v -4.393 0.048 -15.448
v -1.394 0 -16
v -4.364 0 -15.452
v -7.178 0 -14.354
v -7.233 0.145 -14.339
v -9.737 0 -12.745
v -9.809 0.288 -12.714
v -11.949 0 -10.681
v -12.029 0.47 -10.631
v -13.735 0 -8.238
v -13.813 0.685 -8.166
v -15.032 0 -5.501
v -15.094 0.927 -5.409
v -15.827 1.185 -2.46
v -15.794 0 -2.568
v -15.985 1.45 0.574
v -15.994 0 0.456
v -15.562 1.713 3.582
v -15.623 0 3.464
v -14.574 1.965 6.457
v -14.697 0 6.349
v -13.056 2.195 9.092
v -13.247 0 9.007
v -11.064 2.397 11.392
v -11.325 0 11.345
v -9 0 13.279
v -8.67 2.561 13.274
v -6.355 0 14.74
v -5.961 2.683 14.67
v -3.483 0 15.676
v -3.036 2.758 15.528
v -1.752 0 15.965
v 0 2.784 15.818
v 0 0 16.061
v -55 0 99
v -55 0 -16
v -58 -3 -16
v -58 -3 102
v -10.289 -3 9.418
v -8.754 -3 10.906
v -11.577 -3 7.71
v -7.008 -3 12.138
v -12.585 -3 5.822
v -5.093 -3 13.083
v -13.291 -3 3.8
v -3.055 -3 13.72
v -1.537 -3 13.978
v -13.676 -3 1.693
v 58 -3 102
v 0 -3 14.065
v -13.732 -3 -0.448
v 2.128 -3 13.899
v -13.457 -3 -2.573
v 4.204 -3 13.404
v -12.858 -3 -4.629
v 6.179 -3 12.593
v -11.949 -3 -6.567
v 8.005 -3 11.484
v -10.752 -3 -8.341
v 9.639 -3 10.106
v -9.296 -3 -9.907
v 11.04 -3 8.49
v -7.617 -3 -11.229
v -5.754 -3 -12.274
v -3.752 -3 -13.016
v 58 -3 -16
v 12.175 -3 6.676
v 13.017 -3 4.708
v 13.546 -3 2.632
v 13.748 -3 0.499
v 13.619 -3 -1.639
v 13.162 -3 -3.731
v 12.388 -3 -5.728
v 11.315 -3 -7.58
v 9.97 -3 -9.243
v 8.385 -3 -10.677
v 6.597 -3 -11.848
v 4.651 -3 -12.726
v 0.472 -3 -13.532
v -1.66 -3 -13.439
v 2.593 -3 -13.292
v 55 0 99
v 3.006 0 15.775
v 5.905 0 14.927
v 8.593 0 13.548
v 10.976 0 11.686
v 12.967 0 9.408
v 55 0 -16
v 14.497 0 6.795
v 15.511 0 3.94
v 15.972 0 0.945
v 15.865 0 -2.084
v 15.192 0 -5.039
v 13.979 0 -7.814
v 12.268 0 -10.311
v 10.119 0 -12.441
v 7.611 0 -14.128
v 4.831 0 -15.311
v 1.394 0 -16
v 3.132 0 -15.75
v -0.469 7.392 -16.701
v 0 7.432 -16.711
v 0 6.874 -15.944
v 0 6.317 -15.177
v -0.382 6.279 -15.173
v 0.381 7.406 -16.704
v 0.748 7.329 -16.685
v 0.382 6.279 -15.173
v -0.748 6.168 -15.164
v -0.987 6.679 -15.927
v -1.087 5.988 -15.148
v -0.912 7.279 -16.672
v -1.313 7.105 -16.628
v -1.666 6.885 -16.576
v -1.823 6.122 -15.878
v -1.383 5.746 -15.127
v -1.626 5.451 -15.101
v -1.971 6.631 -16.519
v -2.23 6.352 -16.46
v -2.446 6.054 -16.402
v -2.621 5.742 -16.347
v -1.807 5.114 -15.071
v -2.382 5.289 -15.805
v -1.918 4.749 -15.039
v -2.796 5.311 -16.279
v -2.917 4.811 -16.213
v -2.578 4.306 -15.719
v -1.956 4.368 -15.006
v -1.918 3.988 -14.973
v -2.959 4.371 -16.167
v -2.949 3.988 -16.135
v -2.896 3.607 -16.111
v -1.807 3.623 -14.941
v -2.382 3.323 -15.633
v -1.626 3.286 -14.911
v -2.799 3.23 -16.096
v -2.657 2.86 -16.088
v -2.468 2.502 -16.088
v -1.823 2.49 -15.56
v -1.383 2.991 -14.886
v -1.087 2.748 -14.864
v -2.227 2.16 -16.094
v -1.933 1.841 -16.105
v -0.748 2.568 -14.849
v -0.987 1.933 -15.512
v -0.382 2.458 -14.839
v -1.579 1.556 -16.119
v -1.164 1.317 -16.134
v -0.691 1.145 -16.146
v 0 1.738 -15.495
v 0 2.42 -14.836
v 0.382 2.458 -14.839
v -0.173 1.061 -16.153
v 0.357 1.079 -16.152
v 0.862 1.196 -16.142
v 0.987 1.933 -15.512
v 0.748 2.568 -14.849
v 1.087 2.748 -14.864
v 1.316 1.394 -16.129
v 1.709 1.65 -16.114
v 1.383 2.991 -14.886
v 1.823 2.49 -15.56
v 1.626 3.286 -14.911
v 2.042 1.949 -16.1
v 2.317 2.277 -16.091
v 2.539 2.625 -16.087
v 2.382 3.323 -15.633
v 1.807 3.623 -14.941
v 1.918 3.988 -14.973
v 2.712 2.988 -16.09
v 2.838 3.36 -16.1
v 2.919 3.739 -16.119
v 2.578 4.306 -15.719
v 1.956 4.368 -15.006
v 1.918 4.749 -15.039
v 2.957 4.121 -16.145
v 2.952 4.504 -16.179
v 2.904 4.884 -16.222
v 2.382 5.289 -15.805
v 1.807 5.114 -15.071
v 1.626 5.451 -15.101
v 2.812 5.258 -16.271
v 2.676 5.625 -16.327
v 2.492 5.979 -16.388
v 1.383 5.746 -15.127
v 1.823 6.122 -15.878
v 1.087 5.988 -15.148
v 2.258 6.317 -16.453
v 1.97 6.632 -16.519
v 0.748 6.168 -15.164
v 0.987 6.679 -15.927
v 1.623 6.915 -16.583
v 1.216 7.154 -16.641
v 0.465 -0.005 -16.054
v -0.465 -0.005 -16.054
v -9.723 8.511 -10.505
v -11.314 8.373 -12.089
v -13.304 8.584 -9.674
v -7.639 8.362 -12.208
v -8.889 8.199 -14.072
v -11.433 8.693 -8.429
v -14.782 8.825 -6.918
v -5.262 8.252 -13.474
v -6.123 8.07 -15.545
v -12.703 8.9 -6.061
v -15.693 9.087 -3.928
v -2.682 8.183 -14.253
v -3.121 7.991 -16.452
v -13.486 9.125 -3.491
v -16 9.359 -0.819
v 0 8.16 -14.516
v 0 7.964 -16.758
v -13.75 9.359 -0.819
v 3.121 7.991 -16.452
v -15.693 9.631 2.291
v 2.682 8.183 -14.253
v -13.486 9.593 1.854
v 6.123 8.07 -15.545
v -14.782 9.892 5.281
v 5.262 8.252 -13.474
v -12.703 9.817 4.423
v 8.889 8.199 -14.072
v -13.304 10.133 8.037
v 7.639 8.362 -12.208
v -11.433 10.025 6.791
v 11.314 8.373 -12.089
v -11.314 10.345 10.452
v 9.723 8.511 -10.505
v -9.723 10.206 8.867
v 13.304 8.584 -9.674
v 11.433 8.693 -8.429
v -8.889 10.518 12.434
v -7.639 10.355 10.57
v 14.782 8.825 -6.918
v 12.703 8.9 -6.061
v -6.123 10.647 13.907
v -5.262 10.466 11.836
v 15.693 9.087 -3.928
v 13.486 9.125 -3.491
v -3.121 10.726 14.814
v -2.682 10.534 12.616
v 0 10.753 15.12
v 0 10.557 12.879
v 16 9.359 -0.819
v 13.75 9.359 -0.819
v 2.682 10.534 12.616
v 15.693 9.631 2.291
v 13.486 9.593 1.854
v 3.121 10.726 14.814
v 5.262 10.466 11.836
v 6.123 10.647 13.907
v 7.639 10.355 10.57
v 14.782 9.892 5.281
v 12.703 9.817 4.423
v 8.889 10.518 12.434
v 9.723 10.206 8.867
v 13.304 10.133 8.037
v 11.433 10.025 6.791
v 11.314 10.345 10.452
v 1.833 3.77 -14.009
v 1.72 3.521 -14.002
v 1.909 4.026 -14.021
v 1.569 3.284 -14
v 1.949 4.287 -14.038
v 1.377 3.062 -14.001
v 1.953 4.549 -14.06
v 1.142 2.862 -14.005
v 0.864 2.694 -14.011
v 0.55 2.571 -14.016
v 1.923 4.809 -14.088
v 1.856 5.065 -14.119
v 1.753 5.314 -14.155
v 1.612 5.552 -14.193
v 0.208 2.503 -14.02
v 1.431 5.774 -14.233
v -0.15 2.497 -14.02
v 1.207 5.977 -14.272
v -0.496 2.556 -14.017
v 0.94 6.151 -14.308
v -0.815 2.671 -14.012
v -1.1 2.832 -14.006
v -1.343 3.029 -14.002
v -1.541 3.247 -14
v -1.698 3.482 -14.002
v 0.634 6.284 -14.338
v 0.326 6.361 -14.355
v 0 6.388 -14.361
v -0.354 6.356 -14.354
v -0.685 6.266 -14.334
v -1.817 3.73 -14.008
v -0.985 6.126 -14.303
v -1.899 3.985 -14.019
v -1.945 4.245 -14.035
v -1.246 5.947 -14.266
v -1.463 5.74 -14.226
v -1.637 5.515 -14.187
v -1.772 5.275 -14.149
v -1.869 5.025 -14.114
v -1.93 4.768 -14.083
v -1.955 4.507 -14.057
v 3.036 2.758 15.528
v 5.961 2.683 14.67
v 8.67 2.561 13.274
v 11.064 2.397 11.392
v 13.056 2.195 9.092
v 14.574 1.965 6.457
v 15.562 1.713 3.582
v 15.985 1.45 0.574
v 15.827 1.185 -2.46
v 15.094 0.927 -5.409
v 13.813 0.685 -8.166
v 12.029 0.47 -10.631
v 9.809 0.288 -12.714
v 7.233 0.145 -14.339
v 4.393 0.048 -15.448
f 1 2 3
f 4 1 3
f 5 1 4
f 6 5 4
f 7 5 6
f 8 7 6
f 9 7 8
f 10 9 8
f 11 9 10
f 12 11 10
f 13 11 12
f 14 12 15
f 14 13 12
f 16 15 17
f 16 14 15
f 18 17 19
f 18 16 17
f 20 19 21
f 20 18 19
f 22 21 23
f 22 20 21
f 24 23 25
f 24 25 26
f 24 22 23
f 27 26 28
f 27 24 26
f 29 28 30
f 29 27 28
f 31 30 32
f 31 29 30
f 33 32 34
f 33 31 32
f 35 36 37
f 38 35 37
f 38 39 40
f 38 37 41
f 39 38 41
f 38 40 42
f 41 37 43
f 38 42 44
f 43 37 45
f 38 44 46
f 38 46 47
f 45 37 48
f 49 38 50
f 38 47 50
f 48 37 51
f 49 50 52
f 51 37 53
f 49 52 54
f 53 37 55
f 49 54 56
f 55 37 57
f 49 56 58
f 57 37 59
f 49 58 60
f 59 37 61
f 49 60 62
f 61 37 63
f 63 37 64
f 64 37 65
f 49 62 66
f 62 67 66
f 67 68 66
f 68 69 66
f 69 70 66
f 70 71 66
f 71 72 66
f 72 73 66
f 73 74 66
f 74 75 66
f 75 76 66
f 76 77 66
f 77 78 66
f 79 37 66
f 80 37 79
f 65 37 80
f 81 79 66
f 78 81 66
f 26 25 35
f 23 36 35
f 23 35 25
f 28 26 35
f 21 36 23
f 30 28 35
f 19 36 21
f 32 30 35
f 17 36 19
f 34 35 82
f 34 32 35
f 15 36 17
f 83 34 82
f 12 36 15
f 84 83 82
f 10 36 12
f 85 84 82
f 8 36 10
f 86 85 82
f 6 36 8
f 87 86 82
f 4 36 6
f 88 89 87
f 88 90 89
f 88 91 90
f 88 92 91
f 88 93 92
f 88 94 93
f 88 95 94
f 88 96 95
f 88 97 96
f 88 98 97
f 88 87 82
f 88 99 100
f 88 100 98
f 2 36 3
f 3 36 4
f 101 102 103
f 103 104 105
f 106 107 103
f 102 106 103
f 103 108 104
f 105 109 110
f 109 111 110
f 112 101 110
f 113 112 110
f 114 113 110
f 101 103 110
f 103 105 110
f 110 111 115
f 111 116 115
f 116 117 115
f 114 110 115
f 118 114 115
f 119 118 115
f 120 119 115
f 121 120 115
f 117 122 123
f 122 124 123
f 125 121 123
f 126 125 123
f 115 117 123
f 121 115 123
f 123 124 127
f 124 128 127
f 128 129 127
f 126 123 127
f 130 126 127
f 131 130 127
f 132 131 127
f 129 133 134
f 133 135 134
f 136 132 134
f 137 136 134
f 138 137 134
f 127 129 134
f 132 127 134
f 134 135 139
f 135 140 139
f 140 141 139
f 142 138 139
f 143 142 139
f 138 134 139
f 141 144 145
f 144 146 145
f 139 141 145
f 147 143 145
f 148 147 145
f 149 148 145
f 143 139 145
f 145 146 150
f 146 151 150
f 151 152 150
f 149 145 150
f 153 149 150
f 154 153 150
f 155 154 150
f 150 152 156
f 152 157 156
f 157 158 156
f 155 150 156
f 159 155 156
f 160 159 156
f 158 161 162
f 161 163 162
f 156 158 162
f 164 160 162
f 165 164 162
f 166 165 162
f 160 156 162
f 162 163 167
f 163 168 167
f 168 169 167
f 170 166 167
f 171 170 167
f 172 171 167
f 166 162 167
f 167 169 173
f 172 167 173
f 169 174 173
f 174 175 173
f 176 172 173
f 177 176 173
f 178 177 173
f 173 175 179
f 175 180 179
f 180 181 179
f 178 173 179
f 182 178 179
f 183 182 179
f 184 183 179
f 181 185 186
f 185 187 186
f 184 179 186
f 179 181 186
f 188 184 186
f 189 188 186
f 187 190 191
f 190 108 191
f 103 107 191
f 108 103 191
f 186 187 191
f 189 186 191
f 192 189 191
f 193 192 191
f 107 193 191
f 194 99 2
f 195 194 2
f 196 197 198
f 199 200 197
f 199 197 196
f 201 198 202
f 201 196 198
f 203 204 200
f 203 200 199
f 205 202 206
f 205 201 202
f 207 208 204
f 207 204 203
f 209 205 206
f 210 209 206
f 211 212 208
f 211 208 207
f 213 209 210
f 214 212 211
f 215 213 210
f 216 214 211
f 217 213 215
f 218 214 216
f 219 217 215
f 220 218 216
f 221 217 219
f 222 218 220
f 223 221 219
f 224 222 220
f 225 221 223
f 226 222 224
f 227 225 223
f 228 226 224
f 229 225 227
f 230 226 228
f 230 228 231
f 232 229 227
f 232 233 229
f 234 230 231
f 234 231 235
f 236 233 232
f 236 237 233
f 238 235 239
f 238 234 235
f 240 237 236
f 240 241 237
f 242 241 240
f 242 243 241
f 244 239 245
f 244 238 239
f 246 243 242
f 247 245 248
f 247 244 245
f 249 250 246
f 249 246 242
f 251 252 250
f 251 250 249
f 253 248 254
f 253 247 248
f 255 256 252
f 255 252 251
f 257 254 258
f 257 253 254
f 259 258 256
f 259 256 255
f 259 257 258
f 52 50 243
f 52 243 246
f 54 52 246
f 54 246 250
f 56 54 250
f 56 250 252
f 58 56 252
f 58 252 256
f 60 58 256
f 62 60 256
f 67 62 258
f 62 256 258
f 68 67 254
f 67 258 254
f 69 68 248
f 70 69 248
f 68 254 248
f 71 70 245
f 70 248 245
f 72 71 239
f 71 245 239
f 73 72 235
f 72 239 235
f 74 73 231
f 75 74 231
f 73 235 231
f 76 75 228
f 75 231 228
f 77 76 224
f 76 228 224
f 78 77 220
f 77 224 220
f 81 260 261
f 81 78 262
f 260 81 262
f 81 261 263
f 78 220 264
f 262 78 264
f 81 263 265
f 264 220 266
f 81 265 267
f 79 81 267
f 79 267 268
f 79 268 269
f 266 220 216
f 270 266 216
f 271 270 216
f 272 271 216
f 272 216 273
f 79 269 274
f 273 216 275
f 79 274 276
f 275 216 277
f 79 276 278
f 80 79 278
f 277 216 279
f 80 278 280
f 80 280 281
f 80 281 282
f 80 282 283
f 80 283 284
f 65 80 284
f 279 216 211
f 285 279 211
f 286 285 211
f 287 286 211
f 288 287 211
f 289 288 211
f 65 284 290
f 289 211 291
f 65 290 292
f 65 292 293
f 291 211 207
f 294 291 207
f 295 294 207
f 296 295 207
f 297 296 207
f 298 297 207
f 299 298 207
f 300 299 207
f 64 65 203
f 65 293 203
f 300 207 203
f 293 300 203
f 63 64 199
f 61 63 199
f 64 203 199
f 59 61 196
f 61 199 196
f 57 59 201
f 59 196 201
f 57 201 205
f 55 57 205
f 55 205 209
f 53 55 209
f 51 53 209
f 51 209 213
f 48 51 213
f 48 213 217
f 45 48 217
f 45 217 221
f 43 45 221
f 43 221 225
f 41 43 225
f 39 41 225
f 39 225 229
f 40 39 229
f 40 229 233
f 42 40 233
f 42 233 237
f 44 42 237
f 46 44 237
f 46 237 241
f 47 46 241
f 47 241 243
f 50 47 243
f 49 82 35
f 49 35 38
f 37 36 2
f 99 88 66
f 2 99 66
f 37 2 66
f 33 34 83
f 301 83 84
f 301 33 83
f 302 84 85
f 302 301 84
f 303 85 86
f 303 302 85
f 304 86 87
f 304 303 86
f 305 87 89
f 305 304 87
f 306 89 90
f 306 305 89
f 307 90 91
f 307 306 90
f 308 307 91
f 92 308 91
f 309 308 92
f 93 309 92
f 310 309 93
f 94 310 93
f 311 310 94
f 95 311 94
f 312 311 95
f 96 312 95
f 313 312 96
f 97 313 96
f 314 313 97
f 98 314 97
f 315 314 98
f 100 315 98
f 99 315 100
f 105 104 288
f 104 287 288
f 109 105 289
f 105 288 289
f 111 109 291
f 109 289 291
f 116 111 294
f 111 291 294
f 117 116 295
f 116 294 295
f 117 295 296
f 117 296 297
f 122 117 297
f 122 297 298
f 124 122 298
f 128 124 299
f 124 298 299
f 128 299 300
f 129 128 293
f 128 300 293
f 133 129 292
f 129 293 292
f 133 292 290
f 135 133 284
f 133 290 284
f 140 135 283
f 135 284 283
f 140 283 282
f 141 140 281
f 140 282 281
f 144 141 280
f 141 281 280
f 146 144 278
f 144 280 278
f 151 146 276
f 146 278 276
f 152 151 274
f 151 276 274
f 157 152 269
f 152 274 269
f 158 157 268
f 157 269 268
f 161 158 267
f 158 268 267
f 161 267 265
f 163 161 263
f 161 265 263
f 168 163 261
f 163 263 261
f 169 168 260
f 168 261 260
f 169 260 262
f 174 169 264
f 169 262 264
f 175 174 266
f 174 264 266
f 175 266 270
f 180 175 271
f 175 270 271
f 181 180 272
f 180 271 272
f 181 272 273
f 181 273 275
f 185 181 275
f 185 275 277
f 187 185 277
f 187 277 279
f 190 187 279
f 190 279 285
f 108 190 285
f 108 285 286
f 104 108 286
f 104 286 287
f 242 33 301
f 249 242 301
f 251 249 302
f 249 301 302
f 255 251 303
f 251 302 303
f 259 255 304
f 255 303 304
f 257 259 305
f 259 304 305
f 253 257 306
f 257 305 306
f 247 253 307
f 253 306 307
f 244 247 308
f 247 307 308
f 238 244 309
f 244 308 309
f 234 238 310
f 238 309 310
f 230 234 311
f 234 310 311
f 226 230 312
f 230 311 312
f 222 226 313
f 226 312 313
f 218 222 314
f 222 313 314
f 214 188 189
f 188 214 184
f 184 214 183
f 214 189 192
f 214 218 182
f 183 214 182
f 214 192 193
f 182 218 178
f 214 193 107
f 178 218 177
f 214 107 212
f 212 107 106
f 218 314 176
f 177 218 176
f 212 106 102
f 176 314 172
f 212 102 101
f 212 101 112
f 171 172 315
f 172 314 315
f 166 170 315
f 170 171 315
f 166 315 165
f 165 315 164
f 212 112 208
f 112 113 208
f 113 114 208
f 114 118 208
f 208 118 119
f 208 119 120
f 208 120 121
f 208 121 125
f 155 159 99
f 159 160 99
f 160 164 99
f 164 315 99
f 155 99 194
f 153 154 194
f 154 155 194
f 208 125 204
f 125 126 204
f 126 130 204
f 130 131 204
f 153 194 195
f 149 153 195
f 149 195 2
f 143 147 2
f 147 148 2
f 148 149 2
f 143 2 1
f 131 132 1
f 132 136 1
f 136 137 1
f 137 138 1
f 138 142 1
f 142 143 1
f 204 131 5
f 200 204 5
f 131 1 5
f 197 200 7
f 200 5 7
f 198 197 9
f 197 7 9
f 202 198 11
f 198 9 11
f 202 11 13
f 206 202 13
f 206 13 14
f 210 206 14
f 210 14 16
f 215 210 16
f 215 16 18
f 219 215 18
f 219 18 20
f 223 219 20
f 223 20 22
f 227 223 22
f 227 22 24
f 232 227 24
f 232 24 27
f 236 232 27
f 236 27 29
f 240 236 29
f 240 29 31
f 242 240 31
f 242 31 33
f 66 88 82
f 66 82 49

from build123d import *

# Parameters (mm, degrees)
SKETCH1_W                                      = 120
SKETCH1_H                                      = 120
BOSS_EXTRUDE1_DEPTH                            = 3
SKETCH2_R                                      = 16
BOSS_EXTRUDE2_DEPTH                            = 8
BOSS_EXTRUDE2_DIRECTION_2_REACH                = 122.252
SKETCH3_R                                      = 13.75
CUT_EXTRUDE1_DEPTH                             = 122.407232036
CHAMFER1_SIZE                                  = 5
CSK_FOR_5_FLAT_HEAD_MACHINE_SCREW2_D           = 3.9116
CSK_FOR_5_FLAT_HEAD_MACHINE_SCREW2_DEPTH       = 10.1
CSK_FOR_5_FLAT_HEAD_MACHINE_SCREW2_CSINK_D     = 6.4008
CSK_FOR_5_FLAT_HEAD_MACHINE_SCREW2_CSINK_ANGLE = 82
CSK_FOR_5_FLAT_HEAD_MACHINE_SCREW2_TIP         = 1.175163199


with BuildPart() as part:
    # Sketch1 → Boss-Extrude1 (new body)
    with BuildSketch(Plane(origin=(0, 0, 0), x_dir=(1, 0, 0), z_dir=(0, 1, 0))):
        with Locations((0, -44)):
            Rectangle(SKETCH1_W, SKETCH1_H)
    extrude(amount=-BOSS_EXTRUDE1_DEPTH)

    # Sketch2 → Boss-Extrude2 (add)
    with BuildSketch(Plane(origin=(0, 1.389185421, -0.121537976), x_dir=(-1, 0, 0), z_dir=(0, 0.9961946980917455, -0.08715574274765836))):
        with Locations(Location((0, 0, 0), (0, 0, 90))):
            Circle(SKETCH2_R)
    extrude(amount=BOSS_EXTRUDE2_DEPTH)

    # Boss-Extrude2 direction 2: up to this face of the body (flat: up to its plane)
    boss_extrude2_direction_2_end = Plane(part.part.faces().sort_by_distance((0, 0, 44))[0])
    # Sketch2 → Boss-Extrude2 direction 2 (add, up to the picked face)
    with BuildSketch(Plane(origin=(0, 1.389185421, -0.121537976), x_dir=(-1, 0, 0), z_dir=(0, 0.9961946980917455, -0.08715574274765836)), mode=Mode.PRIVATE) as boss_extrude2_direction_2_sk1:
        with Locations(Location((0, 0, 0), (0, 0, 90))):
            Circle(SKETCH2_R)
    boss_extrude2_direction_2_tool1 = split(extrude(boss_extrude2_direction_2_sk1.sketch, amount=-BOSS_EXTRUDE2_DIRECTION_2_REACH, mode=Mode.PRIVATE), bisect_by=boss_extrude2_direction_2_end, keep=Keep.BOTH, mode=Mode.PRIVATE)
    add(boss_extrude2_direction_2_tool1.solids().sort_by(Axis((0, 1.389185, -0.121538), (0, -0.9961946980917455, 0.08715574274765836)))[0])

    # Sketch3 → Cut-Extrude1 (cut, through all)
    with BuildSketch(Plane(origin=(0, 9.358743006, -0.818783918), x_dir=(1, 0, 0), z_dir=(0, 0.9961946980917457, -0.08715574274765836))):
        with Locations(Location((0, 0, 0), (0, 0, 270))):
            Circle(SKETCH3_R)
    extrude(amount=-CUT_EXTRUDE1_DEPTH, mode=Mode.SUBTRACT)

    # Chamfer1
    # the kernel refuses this chamfer: 5 mm, written as the material it takes off along each edge
    with BuildSketch(Plane(origin=(60, 0, -28.85841494), x_dir=(-0.9996219169112968, 0.027495876610586372, 0), z_dir=(0, 0, 1)), Plane(origin=(72.85841494, 0, 104), x_dir=(0, 0.027495876610586334, -0.9996219169112968), z_dir=(-1, 0, 0)), Plane(origin=(-60, 0, 116.85841494), x_dir=(0.9996219169112968, 0.027495876610586372, 0), z_dir=(0, 0, -1))) as chamfer1_piece_1:
        Polygon((CHAMFER1_SIZE * 0.999621916911, CHAMFER1_SIZE * 0.0274958766106), (-CHAMFER1_SIZE * 0.0274958766106, CHAMFER1_SIZE * 0.999621916911), (0, 0), align=None)
    extrude(amount=145.71682988, mode=Mode.SUBTRACT)

    # CSK for #5 Flat Head Machine Screw2
    with Locations(Plane(origin=(0, 4.243645214, -16.432388249), x_dir=(0, -0.996194698092, 0.087155742748), z_dir=(0, -0.087155742748, -0.996194698092))):
        with Locations((0, 0)):
            CounterSinkHole(CSK_FOR_5_FLAT_HEAD_MACHINE_SCREW2_D / 2, CSK_FOR_5_FLAT_HEAD_MACHINE_SCREW2_CSINK_D / 2, depth=CSK_FOR_5_FLAT_HEAD_MACHINE_SCREW2_DEPTH, counter_sink_angle=CSK_FOR_5_FLAT_HEAD_MACHINE_SCREW2_CSINK_ANGLE)
            with Locations((0, 0, -(CSK_FOR_5_FLAT_HEAD_MACHINE_SCREW2_DEPTH + CSK_FOR_5_FLAT_HEAD_MACHINE_SCREW2_TIP / 2))):  # 118° drill point
                Cone(0, CSK_FOR_5_FLAT_HEAD_MACHINE_SCREW2_D / 2, CSK_FOR_5_FLAT_HEAD_MACHINE_SCREW2_TIP, mode=Mode.SUBTRACT)


solid = part.part
